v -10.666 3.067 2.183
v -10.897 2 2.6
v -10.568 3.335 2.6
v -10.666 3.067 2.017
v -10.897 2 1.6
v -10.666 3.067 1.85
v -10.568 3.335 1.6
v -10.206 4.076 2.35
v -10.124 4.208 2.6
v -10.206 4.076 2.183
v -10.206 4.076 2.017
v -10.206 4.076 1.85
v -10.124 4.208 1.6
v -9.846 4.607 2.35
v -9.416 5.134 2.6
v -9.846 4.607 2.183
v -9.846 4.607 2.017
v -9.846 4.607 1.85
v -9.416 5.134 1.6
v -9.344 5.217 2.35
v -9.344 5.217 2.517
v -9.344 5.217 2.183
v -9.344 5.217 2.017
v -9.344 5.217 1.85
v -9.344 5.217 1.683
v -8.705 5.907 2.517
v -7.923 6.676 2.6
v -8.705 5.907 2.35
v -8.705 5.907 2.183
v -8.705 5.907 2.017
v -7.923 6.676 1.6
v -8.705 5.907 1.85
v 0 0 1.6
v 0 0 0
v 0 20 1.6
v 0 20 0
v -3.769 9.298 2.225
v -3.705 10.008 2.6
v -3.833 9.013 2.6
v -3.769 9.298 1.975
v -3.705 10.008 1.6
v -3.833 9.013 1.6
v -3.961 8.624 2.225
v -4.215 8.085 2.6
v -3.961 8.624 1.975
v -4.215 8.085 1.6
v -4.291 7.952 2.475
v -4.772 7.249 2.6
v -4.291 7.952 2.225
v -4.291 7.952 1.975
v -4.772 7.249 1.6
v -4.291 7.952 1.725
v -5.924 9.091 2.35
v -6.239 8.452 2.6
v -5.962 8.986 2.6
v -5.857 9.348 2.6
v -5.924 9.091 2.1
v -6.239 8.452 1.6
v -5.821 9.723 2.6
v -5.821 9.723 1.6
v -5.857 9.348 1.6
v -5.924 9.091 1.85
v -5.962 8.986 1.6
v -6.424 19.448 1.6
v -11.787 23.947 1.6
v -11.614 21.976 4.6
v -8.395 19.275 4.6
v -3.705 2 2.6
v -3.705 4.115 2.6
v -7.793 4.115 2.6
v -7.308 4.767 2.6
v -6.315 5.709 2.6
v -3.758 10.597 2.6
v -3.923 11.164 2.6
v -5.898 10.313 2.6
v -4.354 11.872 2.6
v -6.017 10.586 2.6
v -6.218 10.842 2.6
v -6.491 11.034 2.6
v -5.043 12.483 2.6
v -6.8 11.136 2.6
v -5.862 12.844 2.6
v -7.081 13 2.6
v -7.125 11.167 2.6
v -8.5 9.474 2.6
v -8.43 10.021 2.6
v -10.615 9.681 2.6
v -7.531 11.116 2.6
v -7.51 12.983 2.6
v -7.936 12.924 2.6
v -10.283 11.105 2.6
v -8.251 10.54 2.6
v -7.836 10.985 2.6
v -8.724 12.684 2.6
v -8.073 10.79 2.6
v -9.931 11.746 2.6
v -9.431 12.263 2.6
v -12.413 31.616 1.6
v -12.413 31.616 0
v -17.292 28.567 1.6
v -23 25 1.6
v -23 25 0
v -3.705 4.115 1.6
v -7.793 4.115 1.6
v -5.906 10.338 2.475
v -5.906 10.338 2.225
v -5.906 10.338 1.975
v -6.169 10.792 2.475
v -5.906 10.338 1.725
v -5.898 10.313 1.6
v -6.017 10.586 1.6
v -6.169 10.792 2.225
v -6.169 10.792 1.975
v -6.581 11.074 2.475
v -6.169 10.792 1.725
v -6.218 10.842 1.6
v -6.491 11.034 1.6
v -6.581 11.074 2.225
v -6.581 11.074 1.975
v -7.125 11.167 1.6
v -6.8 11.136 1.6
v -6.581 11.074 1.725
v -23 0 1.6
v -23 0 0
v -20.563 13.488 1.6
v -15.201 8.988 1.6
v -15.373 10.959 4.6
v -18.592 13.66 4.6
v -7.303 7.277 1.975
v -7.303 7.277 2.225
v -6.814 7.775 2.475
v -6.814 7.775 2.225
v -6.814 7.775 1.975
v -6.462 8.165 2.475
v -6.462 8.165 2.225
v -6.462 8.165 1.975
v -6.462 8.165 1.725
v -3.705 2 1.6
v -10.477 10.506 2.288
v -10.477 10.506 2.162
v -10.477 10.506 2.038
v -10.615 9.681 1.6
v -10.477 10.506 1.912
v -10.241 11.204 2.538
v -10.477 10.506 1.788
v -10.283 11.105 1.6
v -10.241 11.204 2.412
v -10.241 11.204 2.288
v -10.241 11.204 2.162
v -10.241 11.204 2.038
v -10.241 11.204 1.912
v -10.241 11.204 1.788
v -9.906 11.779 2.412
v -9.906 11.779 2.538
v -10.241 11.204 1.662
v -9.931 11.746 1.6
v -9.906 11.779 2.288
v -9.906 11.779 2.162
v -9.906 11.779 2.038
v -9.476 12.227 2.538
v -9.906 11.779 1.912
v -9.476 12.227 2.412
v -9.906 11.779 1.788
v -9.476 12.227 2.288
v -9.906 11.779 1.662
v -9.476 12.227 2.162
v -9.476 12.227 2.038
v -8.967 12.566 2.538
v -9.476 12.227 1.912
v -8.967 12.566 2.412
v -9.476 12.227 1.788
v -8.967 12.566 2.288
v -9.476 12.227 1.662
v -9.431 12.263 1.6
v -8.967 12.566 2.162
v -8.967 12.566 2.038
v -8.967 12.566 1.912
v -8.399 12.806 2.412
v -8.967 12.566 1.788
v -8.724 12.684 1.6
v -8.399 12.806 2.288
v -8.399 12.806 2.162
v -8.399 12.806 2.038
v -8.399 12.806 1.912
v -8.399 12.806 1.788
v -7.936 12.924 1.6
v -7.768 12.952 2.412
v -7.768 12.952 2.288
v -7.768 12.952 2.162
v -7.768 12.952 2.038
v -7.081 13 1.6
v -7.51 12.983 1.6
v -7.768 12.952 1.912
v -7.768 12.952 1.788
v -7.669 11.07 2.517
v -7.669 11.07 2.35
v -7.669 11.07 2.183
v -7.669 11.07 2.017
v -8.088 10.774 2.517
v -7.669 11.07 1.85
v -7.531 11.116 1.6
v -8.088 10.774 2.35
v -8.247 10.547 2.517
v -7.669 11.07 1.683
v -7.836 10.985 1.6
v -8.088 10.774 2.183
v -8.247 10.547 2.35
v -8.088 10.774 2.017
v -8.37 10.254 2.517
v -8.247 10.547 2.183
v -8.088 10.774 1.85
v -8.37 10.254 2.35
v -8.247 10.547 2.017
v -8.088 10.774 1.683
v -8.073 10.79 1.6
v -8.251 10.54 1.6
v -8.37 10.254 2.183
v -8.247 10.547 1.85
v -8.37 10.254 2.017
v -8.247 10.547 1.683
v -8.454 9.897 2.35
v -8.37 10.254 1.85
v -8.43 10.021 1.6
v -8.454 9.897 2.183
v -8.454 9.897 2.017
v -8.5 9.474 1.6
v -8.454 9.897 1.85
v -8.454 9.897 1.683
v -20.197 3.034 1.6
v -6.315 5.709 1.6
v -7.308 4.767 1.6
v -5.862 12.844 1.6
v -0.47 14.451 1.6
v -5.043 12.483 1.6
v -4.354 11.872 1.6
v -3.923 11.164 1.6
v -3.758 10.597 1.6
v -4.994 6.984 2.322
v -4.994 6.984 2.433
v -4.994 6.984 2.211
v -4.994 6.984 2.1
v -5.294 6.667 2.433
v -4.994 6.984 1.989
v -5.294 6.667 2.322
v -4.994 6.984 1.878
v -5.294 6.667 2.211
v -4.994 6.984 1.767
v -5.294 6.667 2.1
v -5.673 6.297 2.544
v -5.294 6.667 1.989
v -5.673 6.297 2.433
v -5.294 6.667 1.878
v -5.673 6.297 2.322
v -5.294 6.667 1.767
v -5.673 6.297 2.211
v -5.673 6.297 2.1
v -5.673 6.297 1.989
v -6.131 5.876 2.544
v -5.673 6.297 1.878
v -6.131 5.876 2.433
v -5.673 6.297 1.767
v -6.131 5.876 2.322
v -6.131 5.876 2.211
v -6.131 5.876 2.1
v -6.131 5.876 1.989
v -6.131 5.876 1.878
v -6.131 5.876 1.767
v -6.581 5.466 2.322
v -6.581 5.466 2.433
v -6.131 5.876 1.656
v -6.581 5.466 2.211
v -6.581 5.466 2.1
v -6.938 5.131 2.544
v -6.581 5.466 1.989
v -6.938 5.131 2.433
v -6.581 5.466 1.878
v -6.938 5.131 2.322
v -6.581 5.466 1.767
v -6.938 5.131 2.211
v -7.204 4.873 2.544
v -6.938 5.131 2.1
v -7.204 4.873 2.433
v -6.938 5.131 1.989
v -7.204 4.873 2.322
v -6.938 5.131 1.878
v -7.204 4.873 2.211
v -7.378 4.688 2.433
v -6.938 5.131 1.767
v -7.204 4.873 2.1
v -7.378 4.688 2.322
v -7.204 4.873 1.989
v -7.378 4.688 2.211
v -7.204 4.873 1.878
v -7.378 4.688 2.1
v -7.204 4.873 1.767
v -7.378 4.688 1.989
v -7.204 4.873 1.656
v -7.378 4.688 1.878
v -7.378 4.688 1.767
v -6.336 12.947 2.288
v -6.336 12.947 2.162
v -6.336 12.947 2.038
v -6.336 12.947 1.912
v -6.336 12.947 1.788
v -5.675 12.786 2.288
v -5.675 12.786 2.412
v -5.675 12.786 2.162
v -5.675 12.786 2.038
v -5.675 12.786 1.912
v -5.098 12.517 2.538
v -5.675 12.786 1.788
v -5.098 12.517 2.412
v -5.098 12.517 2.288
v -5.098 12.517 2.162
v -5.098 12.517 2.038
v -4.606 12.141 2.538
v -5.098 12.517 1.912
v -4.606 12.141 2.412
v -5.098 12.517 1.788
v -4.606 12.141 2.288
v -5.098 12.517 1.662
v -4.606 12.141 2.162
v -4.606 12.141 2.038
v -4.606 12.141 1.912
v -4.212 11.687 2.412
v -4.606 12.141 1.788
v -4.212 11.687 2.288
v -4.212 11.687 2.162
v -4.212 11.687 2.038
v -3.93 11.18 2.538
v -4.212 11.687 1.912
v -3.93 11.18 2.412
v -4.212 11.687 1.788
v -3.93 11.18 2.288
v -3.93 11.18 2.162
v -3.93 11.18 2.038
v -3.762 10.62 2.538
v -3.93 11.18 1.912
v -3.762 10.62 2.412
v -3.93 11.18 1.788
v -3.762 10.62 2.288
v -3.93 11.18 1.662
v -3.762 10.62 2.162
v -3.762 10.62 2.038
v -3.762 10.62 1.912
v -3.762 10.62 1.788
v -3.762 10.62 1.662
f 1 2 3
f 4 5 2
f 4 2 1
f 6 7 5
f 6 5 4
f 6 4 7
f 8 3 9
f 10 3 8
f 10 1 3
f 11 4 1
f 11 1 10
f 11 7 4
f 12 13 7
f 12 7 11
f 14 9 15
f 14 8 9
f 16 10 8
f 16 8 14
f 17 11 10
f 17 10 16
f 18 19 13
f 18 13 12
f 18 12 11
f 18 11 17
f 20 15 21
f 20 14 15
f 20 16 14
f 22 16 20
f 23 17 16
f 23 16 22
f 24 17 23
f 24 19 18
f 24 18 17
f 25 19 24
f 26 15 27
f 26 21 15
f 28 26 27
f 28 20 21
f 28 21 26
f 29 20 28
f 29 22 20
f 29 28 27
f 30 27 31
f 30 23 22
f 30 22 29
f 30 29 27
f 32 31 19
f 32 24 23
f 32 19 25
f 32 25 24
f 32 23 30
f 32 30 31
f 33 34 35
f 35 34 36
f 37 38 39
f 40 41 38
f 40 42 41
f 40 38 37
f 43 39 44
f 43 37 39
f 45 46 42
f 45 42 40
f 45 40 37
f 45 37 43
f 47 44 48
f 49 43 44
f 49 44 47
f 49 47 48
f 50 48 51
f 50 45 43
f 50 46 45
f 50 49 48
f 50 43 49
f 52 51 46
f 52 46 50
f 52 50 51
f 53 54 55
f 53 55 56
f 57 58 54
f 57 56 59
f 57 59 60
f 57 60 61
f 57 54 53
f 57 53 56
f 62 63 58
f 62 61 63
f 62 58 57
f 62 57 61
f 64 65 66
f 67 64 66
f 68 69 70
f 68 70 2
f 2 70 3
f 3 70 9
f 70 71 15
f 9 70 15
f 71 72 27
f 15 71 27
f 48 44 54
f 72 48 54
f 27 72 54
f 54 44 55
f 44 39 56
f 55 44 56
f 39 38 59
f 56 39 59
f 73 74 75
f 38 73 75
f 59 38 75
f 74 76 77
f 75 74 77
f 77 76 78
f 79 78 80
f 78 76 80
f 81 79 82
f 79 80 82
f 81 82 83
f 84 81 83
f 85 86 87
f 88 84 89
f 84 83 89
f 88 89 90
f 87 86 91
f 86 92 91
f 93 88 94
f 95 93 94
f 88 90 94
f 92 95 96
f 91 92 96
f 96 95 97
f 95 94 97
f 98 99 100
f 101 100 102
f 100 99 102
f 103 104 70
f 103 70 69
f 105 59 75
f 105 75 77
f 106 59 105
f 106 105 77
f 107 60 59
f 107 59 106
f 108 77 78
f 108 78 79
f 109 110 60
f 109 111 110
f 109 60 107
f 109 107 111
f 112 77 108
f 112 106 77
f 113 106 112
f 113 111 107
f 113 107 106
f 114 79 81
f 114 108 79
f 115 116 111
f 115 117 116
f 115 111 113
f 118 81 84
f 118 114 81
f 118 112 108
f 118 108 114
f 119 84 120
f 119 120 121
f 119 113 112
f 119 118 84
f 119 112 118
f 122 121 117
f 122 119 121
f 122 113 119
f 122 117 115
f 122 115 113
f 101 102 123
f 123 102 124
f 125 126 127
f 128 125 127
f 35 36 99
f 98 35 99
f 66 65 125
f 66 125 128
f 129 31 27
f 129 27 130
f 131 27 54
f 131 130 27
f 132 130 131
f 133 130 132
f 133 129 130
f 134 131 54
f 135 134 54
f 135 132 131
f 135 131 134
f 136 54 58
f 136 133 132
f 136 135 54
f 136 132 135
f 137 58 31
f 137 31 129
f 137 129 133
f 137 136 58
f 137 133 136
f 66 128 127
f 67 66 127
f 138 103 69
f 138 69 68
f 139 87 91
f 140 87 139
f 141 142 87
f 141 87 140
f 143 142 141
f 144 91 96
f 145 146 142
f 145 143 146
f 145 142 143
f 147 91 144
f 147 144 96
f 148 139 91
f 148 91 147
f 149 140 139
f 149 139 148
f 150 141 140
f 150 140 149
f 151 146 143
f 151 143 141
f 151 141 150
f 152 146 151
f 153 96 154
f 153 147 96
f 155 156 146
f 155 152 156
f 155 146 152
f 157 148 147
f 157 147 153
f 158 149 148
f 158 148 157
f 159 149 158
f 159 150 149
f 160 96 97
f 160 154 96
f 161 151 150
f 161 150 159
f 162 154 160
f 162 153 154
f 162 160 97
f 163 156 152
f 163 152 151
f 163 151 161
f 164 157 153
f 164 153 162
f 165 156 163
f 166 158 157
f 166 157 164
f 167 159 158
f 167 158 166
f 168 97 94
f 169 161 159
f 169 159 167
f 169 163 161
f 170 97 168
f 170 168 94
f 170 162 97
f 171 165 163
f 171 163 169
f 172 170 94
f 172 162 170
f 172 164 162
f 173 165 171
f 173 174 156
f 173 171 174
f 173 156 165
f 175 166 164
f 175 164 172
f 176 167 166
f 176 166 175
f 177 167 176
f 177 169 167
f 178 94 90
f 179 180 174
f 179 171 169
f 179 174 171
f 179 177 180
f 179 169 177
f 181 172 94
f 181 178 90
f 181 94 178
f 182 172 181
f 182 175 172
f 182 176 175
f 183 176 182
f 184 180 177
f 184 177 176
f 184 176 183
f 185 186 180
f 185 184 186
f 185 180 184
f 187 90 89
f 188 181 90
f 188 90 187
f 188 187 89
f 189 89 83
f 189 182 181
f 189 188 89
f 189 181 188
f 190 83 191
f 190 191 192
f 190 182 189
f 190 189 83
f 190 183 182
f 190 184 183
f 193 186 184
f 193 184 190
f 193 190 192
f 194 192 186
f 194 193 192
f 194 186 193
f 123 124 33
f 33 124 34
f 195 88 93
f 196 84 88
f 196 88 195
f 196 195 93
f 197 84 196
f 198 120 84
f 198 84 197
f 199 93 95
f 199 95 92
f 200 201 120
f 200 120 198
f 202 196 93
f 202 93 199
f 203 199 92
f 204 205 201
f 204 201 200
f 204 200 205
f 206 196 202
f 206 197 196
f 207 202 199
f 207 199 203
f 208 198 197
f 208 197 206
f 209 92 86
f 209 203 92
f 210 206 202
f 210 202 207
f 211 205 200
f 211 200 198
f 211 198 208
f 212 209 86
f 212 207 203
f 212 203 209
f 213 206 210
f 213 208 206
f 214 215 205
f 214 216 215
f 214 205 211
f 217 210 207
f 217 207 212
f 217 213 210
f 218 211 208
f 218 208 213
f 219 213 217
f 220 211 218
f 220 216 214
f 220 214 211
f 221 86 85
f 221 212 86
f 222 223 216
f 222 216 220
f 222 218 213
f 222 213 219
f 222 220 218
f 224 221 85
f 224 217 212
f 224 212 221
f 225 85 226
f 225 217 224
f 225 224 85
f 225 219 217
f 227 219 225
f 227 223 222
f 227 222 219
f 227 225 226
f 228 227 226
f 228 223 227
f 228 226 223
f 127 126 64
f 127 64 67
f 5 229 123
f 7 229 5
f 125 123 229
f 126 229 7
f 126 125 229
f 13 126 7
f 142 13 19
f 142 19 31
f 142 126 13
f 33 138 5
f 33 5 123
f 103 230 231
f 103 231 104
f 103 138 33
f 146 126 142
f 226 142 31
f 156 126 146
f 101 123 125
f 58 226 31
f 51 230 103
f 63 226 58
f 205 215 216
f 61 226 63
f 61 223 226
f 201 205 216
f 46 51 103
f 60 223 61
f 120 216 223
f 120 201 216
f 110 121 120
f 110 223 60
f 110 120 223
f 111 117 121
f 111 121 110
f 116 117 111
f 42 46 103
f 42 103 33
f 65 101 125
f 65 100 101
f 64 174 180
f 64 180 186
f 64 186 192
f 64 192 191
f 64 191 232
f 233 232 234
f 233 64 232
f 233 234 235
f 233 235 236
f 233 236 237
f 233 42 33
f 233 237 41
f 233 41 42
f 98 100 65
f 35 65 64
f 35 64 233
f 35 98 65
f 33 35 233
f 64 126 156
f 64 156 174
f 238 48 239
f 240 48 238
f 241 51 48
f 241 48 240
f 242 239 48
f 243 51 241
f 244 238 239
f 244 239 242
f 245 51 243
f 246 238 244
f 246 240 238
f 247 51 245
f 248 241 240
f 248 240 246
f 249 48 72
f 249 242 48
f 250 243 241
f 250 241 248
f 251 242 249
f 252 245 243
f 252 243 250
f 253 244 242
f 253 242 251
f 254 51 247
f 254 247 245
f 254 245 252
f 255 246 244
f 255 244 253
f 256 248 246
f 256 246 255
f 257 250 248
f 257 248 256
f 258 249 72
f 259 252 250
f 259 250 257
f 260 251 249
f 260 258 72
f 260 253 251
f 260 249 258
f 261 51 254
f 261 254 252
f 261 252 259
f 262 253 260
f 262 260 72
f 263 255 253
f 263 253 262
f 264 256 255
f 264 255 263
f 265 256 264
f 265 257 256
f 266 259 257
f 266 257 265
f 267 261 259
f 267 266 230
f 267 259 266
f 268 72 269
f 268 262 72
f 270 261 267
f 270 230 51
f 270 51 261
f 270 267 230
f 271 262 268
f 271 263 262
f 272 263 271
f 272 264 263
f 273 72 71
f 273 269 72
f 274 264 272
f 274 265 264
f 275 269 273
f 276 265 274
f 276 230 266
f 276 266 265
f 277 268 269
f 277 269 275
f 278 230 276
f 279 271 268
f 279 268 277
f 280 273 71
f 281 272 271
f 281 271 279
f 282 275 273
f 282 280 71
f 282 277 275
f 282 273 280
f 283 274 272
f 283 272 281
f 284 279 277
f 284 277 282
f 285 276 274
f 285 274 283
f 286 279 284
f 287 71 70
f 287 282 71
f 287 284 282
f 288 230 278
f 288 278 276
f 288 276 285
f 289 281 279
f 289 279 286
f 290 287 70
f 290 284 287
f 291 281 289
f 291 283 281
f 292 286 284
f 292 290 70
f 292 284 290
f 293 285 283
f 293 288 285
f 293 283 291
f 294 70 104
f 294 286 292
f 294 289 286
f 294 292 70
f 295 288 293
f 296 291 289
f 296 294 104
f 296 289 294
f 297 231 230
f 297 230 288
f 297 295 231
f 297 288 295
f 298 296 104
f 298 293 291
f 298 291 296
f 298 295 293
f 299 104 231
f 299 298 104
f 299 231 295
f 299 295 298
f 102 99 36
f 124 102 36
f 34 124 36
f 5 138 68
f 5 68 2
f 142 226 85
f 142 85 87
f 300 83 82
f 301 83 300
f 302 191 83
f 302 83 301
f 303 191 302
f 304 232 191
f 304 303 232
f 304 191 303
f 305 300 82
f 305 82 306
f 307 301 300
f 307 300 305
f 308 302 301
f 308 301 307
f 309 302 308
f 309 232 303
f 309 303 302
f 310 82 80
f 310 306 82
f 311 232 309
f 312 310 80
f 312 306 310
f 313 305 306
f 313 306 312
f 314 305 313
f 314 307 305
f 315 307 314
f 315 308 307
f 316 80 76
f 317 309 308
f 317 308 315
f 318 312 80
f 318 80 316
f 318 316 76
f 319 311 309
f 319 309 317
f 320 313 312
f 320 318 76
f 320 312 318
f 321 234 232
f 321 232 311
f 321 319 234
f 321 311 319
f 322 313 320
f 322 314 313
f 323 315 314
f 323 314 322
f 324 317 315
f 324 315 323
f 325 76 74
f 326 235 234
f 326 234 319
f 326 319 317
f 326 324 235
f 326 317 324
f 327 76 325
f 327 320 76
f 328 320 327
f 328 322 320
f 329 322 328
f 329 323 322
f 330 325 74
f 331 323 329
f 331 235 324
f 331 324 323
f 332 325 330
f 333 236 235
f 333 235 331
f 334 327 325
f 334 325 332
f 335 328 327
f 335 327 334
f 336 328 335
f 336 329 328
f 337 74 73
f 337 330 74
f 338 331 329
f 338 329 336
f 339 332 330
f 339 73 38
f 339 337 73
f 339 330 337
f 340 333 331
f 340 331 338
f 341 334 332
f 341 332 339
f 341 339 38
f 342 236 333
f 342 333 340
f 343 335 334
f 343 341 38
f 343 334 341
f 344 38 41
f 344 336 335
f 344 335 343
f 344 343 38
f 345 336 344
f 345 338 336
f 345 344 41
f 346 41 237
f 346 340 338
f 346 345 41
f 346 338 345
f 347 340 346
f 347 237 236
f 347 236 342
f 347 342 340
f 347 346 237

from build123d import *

# Parameters (mm, degrees)
P_IDAT_VYSUNUT_M5_DEPTH = 1.6
P_IDAT_VYSUNUT_M6_DEPTH = 1
P_IDAT_VYSUNUT_M7_DEPTH = 3
ZKOSEN_1_SIZE           = 3
ZKOSEN_1_SIZE_2         = 1.398922974


with BuildPart() as part:
    # Skica1 → Přidat vysunutím5 (new body)
    with BuildSketch(Plane.XY):
        Polygon((0, 0), (0, 20), (-12.412784718, 31.615626352), (-23, 25), (-23, 0), align=None)
    extrude(amount=P_IDAT_VYSUNUT_M5_DEPTH)

    # Skica2 → Přidat vysunutím6 (add)
    with BuildSketch(Plane.XY.offset(1.6)):
        with BuildLine():
            Line((-3.705128205, 4.115384615), (-3.705128205, 2))
            Line((-3.705128205, 2), (-10.897435897, 2))
            add(Edge.make_bspline(
                [(-10.897435897, 2), (-10.87308441, 2.180790308), (-10.824395089, 2.542269551), (-10.673865117, 3.070299742), (-10.472959166, 3.585566992), (-10.254913916, 4.004869463), (-10.038043764, 4.342393523), (-9.841277463, 4.618963346), (-9.60654249, 4.913221767), (-9.337245105, 5.227544267), (-9.034873554, 5.562913411), (-8.697171951, 5.918082368), (-8.322529407, 6.291350846), (-8.058961705, 6.54481851), (-7.922676282, 6.67588141)],
                knots=[0, 0, 0, 0, 1.156289446, 2.311930546, 3.473459201, 4.661751613, 5.303057008, 6.018253237, 6.81459331, 7.690699809, 8.644447906, 9.679642995, 10.800191253, 12, 12, 12, 12], degree=3))
            add(Edge.make_bspline(
                [(-7.922676282, 6.67588141), (-7.813918956, 6.780862005), (-7.606877039, 6.980714138), (-7.312048947, 7.266894293), (-7.052864674, 7.529975199), (-6.823905036, 7.763139303), (-6.630459323, 7.972323552), (-6.469982936, 8.154242742), (-6.34044346, 8.309637702), (-6.270284768, 8.408220362), (-6.239182692, 8.451923077)],
                knots=[0, 0, 0, 0, 1.480720495, 2.818855715, 4.024636094, 5.098235712, 6.019786162, 6.815086302, 7.474715479, 8, 8, 8, 8], degree=3))
            add(Edge.make_bspline(
                [(-6.239182692, 8.451923077), (-6.175493233, 8.557718073), (-6.052643645, 8.761784362), (-5.91792888, 9.082682292), (-5.837068057, 9.403513936), (-5.825971765, 9.617891805), (-5.820512821, 9.723357372)],
                knots=[0, 0, 0, 0, 1.0911822, 2.104764037, 3.067617678, 4, 4, 4, 4], degree=3))
            add(Edge.make_bspline(
                [(-5.820512821, 9.723357372), (-5.824474653, 9.833108474), (-5.831970132, 10.040748999), (-5.894821019, 10.333768175), (-6.006276867, 10.585659667), (-6.15973106, 10.797196661), (-6.353774193, 10.962935085), (-6.580616259, 11.085399693), (-6.843577862, 11.153106661), (-7.028402789, 11.16201224), (-7.125, 11.166666667)],
                knots=[0, 0, 0, 0, 1.193122327, 2.257294386, 3.237245624, 4.168877528, 5.075331632, 5.990371598, 6.949684428, 8, 8, 8, 8], degree=3))
            add(Edge.make_bspline(
                [(-7.125, 11.166666667), (-7.220944609, 11.16231978), (-7.406288878, 11.153922533), (-7.669703299, 11.080565334), (-7.900142302, 10.953576306), (-8.06436539, 10.808860058), (-8.175305876, 10.668134018), (-8.250896853, 10.545500545), (-8.316050374, 10.406151312), (-8.37378183, 10.251655158), (-8.419383153, 10.080242168), (-8.456107626, 9.893217825), (-8.485702239, 9.689575671), (-8.495113848, 9.547907653), (-8.5, 9.474358974)],
                knots=[0, 0, 0, 0, 1.402788338, 2.709884207, 3.961032948, 5.225417836, 5.883680772, 6.578928686, 7.329201998, 8.132101139, 8.990263233, 9.922304639, 10.921339128, 12, 12, 12, 12], degree=3))
            Line((-8.5, 9.474358974), (-10.615384615, 9.681490385))
            add(Edge.make_bspline(
                [(-10.615384615, 9.681490385), (-10.598377251, 9.824305509), (-10.565402688, 10.101201217), (-10.483114114, 10.498918926), (-10.378898684, 10.865831465), (-10.247788098, 11.201257911), (-10.095201314, 11.507331251), (-9.913355139, 11.779458664), (-9.708603468, 12.020654551), (-9.480769352, 12.230790543), (-9.231301205, 12.410535137), (-8.969529148, 12.57098477), (-8.690337423, 12.702604473), (-8.396799939, 12.811078884), (-8.089049352, 12.897770766), (-7.765662274, 12.955090263), (-7.42863453, 12.995409017), (-7.198577984, 12.998446608), (-7.080929487, 13)],
                knots=[0, 0, 0, 0, 1.270971563, 2.464210789, 3.586263665, 4.638946707, 5.643716971, 6.603612468, 7.52484387, 8.434700188, 9.336036235, 10.239171475, 11.145359471, 12.059630629, 13.003312604, 13.96741569, 14.960557767, 16, 16, 16, 16], degree=3))
            add(Edge.make_bspline(
                [(-7.080929487, 13), (-6.953030371, 12.997541845), (-6.703930784, 12.992754281), (-6.34028961, 12.953218534), (-5.998674853, 12.884282231), (-5.676099879, 12.79296634), (-5.375877361, 12.67105295), (-5.095505554, 12.52366473), (-4.83939702, 12.345207999), (-4.603734114, 12.145414763), (-4.393070332, 11.925706984), (-4.20854792, 11.691351493), (-4.053955652, 11.442511564), (-3.924228998, 11.182220281), (-3.827907833, 10.90628918), (-3.757724044, 10.618533633), (-3.711189366, 10.317611197), (-3.707170936, 10.112088), (-3.705128205, 10.007612179)],
                knots=[0, 0, 0, 0, 1.210756838, 2.35810096, 3.457354827, 4.507168606, 5.527358126, 6.519769748, 7.499700793, 8.476517721, 9.440526811, 10.376769937, 11.295256217, 12.209626307, 13.124630862, 14.055668209, 15.011616881, 16, 16, 16, 16], degree=3))
            add(Edge.make_bspline(
                [(-3.705128205, 10.007612179), (-3.707819477, 9.887707131), (-3.713158546, 9.649833916), (-3.764276175, 9.298186238), (-3.84237396, 8.954647512), (-3.957796338, 8.618378159), (-4.104103161, 8.28131186), (-4.292696164, 7.942692037), (-4.511666905, 7.592306518), (-4.683112364, 7.36576699), (-4.771634615, 7.248798077)],
                knots=[0, 0, 0, 0, 0.953409949, 1.89141903, 2.821310783, 3.752688675, 4.715703262, 5.740811754, 6.833515735, 8, 8, 8, 8], degree=3))
            add(Edge.make_bspline(
                [(-4.771634615, 7.248798077), (-4.80509214, 7.206658226), (-4.876750403, 7.116404431), (-4.998659939, 6.978014195), (-5.139942605, 6.826848432), (-5.298602846, 6.660077667), (-5.479881522, 6.483607708), (-5.677256214, 6.290058721), (-5.899411985, 6.089331377), (-6.12951153, 5.876418507), (-6.360611244, 5.669193404), (-6.5730252, 5.472375498), (-6.765967752, 5.298233923), (-6.930453202, 5.137155265), (-7.076156545, 5.000133027), (-7.197826149, 4.880140867), (-7.29773874, 4.780083699), (-7.43541186, 4.624119958), (-7.610585282, 4.413178934), (-7.733826947, 4.21161882), (-7.792668269, 4.115384615)],
                knots=[0, 0, 0, 0, 0.665555651, 1.425465941, 2.280616993, 3.225313414, 4.272635571, 5.410053715, 6.644756443, 7.976022804, 9.288331007, 10.484517221, 11.558462543, 12.503158964, 13.33222979, 14.032602617, 14.617328242, 15.080653724, 16.606167857, 18, 18, 18, 18], degree=3))
            Line((-7.792668269, 4.115384615), (-3.705128205, 4.115384615))
        make_face()
    extrude(amount=P_IDAT_VYSUNUT_M6_DEPTH)

    # Skica3 → Přidat vysunutím7 (add)
    with BuildSketch(Plane.XY.offset(1.6)):
        Polygon((-15.200672089, 8.988396037), (-6.42438967, 19.447562139), (-11.786700772, 23.947075407), (-20.562983191, 13.487909304), align=None)
    extrude(amount=P_IDAT_VYSUNUT_M7_DEPTH)

    # Zkosení1
    # the kernel refuses this chamfer: 3, 1.398922974 mm, written as the material it takes off along each edge
    with BuildSketch(Plane(origin=(-26.517390277, 18.484250095, 4.6), x_dir=(-0.010484614203041273, -0.012495076643438774, -0.9998669641130704), z_dir=(0.7660444431189795, -0.6427876096865376, 0))) as zkosen_1_piece_1:
        Polygon((ZKOSEN_1_SIZE * 0.999866964113, ZKOSEN_1_SIZE * 0.0163111641311), (-ZKOSEN_1_SIZE_2 * 0.0163111641365, ZKOSEN_1_SIZE_2 * 0.999866964445), (0, 0), align=None)
    extrude(amount=14.772926414, mode=Mode.SUBTRACT)
    with BuildSketch(Plane(origin=(-6.790359982, 29.901482493, 4.6), x_dir=(-0.01249507664343894, 0.010484614203041415, -0.9998669641130704), z_dir=(-0.6427876096865377, -0.7660444431189796, 0)), Plane(origin=(-20.197012879, 3.03398895, 4.6), x_dir=(0.012495076643438493, -0.010484614203041037, -0.9998669641130704), z_dir=(0.6427876096865377, 0.7660444431189796, 0))) as zkosen_1_piece_2:
        Polygon((ZKOSEN_1_SIZE * 0.999866964113, ZKOSEN_1_SIZE * 0.0163111641311), (-ZKOSEN_1_SIZE_2 * 0.0163111641365, ZKOSEN_1_SIZE_2 * 0.999866964445), (0, 0), align=None)
    extrude(amount=29.199324499, mode=Mode.SUBTRACT)
    with BuildSketch(Plane(origin=(-0.469982584, 14.451221349, 4.6), x_dir=(0.010484614203041209, 0.01249507664343868, -0.9998669641130704), z_dir=(-0.766044443118979, 0.6427876096865381, 0))) as zkosen_1_piece_3:
        Polygon((ZKOSEN_1_SIZE * 0.999866964113, ZKOSEN_1_SIZE * 0.0163111641311), (-ZKOSEN_1_SIZE_2 * 0.0163111641365, ZKOSEN_1_SIZE_2 * 0.999866964445), (0, 0), align=None)
    extrude(amount=22.545852829, mode=Mode.SUBTRACT)


solid = part.part
